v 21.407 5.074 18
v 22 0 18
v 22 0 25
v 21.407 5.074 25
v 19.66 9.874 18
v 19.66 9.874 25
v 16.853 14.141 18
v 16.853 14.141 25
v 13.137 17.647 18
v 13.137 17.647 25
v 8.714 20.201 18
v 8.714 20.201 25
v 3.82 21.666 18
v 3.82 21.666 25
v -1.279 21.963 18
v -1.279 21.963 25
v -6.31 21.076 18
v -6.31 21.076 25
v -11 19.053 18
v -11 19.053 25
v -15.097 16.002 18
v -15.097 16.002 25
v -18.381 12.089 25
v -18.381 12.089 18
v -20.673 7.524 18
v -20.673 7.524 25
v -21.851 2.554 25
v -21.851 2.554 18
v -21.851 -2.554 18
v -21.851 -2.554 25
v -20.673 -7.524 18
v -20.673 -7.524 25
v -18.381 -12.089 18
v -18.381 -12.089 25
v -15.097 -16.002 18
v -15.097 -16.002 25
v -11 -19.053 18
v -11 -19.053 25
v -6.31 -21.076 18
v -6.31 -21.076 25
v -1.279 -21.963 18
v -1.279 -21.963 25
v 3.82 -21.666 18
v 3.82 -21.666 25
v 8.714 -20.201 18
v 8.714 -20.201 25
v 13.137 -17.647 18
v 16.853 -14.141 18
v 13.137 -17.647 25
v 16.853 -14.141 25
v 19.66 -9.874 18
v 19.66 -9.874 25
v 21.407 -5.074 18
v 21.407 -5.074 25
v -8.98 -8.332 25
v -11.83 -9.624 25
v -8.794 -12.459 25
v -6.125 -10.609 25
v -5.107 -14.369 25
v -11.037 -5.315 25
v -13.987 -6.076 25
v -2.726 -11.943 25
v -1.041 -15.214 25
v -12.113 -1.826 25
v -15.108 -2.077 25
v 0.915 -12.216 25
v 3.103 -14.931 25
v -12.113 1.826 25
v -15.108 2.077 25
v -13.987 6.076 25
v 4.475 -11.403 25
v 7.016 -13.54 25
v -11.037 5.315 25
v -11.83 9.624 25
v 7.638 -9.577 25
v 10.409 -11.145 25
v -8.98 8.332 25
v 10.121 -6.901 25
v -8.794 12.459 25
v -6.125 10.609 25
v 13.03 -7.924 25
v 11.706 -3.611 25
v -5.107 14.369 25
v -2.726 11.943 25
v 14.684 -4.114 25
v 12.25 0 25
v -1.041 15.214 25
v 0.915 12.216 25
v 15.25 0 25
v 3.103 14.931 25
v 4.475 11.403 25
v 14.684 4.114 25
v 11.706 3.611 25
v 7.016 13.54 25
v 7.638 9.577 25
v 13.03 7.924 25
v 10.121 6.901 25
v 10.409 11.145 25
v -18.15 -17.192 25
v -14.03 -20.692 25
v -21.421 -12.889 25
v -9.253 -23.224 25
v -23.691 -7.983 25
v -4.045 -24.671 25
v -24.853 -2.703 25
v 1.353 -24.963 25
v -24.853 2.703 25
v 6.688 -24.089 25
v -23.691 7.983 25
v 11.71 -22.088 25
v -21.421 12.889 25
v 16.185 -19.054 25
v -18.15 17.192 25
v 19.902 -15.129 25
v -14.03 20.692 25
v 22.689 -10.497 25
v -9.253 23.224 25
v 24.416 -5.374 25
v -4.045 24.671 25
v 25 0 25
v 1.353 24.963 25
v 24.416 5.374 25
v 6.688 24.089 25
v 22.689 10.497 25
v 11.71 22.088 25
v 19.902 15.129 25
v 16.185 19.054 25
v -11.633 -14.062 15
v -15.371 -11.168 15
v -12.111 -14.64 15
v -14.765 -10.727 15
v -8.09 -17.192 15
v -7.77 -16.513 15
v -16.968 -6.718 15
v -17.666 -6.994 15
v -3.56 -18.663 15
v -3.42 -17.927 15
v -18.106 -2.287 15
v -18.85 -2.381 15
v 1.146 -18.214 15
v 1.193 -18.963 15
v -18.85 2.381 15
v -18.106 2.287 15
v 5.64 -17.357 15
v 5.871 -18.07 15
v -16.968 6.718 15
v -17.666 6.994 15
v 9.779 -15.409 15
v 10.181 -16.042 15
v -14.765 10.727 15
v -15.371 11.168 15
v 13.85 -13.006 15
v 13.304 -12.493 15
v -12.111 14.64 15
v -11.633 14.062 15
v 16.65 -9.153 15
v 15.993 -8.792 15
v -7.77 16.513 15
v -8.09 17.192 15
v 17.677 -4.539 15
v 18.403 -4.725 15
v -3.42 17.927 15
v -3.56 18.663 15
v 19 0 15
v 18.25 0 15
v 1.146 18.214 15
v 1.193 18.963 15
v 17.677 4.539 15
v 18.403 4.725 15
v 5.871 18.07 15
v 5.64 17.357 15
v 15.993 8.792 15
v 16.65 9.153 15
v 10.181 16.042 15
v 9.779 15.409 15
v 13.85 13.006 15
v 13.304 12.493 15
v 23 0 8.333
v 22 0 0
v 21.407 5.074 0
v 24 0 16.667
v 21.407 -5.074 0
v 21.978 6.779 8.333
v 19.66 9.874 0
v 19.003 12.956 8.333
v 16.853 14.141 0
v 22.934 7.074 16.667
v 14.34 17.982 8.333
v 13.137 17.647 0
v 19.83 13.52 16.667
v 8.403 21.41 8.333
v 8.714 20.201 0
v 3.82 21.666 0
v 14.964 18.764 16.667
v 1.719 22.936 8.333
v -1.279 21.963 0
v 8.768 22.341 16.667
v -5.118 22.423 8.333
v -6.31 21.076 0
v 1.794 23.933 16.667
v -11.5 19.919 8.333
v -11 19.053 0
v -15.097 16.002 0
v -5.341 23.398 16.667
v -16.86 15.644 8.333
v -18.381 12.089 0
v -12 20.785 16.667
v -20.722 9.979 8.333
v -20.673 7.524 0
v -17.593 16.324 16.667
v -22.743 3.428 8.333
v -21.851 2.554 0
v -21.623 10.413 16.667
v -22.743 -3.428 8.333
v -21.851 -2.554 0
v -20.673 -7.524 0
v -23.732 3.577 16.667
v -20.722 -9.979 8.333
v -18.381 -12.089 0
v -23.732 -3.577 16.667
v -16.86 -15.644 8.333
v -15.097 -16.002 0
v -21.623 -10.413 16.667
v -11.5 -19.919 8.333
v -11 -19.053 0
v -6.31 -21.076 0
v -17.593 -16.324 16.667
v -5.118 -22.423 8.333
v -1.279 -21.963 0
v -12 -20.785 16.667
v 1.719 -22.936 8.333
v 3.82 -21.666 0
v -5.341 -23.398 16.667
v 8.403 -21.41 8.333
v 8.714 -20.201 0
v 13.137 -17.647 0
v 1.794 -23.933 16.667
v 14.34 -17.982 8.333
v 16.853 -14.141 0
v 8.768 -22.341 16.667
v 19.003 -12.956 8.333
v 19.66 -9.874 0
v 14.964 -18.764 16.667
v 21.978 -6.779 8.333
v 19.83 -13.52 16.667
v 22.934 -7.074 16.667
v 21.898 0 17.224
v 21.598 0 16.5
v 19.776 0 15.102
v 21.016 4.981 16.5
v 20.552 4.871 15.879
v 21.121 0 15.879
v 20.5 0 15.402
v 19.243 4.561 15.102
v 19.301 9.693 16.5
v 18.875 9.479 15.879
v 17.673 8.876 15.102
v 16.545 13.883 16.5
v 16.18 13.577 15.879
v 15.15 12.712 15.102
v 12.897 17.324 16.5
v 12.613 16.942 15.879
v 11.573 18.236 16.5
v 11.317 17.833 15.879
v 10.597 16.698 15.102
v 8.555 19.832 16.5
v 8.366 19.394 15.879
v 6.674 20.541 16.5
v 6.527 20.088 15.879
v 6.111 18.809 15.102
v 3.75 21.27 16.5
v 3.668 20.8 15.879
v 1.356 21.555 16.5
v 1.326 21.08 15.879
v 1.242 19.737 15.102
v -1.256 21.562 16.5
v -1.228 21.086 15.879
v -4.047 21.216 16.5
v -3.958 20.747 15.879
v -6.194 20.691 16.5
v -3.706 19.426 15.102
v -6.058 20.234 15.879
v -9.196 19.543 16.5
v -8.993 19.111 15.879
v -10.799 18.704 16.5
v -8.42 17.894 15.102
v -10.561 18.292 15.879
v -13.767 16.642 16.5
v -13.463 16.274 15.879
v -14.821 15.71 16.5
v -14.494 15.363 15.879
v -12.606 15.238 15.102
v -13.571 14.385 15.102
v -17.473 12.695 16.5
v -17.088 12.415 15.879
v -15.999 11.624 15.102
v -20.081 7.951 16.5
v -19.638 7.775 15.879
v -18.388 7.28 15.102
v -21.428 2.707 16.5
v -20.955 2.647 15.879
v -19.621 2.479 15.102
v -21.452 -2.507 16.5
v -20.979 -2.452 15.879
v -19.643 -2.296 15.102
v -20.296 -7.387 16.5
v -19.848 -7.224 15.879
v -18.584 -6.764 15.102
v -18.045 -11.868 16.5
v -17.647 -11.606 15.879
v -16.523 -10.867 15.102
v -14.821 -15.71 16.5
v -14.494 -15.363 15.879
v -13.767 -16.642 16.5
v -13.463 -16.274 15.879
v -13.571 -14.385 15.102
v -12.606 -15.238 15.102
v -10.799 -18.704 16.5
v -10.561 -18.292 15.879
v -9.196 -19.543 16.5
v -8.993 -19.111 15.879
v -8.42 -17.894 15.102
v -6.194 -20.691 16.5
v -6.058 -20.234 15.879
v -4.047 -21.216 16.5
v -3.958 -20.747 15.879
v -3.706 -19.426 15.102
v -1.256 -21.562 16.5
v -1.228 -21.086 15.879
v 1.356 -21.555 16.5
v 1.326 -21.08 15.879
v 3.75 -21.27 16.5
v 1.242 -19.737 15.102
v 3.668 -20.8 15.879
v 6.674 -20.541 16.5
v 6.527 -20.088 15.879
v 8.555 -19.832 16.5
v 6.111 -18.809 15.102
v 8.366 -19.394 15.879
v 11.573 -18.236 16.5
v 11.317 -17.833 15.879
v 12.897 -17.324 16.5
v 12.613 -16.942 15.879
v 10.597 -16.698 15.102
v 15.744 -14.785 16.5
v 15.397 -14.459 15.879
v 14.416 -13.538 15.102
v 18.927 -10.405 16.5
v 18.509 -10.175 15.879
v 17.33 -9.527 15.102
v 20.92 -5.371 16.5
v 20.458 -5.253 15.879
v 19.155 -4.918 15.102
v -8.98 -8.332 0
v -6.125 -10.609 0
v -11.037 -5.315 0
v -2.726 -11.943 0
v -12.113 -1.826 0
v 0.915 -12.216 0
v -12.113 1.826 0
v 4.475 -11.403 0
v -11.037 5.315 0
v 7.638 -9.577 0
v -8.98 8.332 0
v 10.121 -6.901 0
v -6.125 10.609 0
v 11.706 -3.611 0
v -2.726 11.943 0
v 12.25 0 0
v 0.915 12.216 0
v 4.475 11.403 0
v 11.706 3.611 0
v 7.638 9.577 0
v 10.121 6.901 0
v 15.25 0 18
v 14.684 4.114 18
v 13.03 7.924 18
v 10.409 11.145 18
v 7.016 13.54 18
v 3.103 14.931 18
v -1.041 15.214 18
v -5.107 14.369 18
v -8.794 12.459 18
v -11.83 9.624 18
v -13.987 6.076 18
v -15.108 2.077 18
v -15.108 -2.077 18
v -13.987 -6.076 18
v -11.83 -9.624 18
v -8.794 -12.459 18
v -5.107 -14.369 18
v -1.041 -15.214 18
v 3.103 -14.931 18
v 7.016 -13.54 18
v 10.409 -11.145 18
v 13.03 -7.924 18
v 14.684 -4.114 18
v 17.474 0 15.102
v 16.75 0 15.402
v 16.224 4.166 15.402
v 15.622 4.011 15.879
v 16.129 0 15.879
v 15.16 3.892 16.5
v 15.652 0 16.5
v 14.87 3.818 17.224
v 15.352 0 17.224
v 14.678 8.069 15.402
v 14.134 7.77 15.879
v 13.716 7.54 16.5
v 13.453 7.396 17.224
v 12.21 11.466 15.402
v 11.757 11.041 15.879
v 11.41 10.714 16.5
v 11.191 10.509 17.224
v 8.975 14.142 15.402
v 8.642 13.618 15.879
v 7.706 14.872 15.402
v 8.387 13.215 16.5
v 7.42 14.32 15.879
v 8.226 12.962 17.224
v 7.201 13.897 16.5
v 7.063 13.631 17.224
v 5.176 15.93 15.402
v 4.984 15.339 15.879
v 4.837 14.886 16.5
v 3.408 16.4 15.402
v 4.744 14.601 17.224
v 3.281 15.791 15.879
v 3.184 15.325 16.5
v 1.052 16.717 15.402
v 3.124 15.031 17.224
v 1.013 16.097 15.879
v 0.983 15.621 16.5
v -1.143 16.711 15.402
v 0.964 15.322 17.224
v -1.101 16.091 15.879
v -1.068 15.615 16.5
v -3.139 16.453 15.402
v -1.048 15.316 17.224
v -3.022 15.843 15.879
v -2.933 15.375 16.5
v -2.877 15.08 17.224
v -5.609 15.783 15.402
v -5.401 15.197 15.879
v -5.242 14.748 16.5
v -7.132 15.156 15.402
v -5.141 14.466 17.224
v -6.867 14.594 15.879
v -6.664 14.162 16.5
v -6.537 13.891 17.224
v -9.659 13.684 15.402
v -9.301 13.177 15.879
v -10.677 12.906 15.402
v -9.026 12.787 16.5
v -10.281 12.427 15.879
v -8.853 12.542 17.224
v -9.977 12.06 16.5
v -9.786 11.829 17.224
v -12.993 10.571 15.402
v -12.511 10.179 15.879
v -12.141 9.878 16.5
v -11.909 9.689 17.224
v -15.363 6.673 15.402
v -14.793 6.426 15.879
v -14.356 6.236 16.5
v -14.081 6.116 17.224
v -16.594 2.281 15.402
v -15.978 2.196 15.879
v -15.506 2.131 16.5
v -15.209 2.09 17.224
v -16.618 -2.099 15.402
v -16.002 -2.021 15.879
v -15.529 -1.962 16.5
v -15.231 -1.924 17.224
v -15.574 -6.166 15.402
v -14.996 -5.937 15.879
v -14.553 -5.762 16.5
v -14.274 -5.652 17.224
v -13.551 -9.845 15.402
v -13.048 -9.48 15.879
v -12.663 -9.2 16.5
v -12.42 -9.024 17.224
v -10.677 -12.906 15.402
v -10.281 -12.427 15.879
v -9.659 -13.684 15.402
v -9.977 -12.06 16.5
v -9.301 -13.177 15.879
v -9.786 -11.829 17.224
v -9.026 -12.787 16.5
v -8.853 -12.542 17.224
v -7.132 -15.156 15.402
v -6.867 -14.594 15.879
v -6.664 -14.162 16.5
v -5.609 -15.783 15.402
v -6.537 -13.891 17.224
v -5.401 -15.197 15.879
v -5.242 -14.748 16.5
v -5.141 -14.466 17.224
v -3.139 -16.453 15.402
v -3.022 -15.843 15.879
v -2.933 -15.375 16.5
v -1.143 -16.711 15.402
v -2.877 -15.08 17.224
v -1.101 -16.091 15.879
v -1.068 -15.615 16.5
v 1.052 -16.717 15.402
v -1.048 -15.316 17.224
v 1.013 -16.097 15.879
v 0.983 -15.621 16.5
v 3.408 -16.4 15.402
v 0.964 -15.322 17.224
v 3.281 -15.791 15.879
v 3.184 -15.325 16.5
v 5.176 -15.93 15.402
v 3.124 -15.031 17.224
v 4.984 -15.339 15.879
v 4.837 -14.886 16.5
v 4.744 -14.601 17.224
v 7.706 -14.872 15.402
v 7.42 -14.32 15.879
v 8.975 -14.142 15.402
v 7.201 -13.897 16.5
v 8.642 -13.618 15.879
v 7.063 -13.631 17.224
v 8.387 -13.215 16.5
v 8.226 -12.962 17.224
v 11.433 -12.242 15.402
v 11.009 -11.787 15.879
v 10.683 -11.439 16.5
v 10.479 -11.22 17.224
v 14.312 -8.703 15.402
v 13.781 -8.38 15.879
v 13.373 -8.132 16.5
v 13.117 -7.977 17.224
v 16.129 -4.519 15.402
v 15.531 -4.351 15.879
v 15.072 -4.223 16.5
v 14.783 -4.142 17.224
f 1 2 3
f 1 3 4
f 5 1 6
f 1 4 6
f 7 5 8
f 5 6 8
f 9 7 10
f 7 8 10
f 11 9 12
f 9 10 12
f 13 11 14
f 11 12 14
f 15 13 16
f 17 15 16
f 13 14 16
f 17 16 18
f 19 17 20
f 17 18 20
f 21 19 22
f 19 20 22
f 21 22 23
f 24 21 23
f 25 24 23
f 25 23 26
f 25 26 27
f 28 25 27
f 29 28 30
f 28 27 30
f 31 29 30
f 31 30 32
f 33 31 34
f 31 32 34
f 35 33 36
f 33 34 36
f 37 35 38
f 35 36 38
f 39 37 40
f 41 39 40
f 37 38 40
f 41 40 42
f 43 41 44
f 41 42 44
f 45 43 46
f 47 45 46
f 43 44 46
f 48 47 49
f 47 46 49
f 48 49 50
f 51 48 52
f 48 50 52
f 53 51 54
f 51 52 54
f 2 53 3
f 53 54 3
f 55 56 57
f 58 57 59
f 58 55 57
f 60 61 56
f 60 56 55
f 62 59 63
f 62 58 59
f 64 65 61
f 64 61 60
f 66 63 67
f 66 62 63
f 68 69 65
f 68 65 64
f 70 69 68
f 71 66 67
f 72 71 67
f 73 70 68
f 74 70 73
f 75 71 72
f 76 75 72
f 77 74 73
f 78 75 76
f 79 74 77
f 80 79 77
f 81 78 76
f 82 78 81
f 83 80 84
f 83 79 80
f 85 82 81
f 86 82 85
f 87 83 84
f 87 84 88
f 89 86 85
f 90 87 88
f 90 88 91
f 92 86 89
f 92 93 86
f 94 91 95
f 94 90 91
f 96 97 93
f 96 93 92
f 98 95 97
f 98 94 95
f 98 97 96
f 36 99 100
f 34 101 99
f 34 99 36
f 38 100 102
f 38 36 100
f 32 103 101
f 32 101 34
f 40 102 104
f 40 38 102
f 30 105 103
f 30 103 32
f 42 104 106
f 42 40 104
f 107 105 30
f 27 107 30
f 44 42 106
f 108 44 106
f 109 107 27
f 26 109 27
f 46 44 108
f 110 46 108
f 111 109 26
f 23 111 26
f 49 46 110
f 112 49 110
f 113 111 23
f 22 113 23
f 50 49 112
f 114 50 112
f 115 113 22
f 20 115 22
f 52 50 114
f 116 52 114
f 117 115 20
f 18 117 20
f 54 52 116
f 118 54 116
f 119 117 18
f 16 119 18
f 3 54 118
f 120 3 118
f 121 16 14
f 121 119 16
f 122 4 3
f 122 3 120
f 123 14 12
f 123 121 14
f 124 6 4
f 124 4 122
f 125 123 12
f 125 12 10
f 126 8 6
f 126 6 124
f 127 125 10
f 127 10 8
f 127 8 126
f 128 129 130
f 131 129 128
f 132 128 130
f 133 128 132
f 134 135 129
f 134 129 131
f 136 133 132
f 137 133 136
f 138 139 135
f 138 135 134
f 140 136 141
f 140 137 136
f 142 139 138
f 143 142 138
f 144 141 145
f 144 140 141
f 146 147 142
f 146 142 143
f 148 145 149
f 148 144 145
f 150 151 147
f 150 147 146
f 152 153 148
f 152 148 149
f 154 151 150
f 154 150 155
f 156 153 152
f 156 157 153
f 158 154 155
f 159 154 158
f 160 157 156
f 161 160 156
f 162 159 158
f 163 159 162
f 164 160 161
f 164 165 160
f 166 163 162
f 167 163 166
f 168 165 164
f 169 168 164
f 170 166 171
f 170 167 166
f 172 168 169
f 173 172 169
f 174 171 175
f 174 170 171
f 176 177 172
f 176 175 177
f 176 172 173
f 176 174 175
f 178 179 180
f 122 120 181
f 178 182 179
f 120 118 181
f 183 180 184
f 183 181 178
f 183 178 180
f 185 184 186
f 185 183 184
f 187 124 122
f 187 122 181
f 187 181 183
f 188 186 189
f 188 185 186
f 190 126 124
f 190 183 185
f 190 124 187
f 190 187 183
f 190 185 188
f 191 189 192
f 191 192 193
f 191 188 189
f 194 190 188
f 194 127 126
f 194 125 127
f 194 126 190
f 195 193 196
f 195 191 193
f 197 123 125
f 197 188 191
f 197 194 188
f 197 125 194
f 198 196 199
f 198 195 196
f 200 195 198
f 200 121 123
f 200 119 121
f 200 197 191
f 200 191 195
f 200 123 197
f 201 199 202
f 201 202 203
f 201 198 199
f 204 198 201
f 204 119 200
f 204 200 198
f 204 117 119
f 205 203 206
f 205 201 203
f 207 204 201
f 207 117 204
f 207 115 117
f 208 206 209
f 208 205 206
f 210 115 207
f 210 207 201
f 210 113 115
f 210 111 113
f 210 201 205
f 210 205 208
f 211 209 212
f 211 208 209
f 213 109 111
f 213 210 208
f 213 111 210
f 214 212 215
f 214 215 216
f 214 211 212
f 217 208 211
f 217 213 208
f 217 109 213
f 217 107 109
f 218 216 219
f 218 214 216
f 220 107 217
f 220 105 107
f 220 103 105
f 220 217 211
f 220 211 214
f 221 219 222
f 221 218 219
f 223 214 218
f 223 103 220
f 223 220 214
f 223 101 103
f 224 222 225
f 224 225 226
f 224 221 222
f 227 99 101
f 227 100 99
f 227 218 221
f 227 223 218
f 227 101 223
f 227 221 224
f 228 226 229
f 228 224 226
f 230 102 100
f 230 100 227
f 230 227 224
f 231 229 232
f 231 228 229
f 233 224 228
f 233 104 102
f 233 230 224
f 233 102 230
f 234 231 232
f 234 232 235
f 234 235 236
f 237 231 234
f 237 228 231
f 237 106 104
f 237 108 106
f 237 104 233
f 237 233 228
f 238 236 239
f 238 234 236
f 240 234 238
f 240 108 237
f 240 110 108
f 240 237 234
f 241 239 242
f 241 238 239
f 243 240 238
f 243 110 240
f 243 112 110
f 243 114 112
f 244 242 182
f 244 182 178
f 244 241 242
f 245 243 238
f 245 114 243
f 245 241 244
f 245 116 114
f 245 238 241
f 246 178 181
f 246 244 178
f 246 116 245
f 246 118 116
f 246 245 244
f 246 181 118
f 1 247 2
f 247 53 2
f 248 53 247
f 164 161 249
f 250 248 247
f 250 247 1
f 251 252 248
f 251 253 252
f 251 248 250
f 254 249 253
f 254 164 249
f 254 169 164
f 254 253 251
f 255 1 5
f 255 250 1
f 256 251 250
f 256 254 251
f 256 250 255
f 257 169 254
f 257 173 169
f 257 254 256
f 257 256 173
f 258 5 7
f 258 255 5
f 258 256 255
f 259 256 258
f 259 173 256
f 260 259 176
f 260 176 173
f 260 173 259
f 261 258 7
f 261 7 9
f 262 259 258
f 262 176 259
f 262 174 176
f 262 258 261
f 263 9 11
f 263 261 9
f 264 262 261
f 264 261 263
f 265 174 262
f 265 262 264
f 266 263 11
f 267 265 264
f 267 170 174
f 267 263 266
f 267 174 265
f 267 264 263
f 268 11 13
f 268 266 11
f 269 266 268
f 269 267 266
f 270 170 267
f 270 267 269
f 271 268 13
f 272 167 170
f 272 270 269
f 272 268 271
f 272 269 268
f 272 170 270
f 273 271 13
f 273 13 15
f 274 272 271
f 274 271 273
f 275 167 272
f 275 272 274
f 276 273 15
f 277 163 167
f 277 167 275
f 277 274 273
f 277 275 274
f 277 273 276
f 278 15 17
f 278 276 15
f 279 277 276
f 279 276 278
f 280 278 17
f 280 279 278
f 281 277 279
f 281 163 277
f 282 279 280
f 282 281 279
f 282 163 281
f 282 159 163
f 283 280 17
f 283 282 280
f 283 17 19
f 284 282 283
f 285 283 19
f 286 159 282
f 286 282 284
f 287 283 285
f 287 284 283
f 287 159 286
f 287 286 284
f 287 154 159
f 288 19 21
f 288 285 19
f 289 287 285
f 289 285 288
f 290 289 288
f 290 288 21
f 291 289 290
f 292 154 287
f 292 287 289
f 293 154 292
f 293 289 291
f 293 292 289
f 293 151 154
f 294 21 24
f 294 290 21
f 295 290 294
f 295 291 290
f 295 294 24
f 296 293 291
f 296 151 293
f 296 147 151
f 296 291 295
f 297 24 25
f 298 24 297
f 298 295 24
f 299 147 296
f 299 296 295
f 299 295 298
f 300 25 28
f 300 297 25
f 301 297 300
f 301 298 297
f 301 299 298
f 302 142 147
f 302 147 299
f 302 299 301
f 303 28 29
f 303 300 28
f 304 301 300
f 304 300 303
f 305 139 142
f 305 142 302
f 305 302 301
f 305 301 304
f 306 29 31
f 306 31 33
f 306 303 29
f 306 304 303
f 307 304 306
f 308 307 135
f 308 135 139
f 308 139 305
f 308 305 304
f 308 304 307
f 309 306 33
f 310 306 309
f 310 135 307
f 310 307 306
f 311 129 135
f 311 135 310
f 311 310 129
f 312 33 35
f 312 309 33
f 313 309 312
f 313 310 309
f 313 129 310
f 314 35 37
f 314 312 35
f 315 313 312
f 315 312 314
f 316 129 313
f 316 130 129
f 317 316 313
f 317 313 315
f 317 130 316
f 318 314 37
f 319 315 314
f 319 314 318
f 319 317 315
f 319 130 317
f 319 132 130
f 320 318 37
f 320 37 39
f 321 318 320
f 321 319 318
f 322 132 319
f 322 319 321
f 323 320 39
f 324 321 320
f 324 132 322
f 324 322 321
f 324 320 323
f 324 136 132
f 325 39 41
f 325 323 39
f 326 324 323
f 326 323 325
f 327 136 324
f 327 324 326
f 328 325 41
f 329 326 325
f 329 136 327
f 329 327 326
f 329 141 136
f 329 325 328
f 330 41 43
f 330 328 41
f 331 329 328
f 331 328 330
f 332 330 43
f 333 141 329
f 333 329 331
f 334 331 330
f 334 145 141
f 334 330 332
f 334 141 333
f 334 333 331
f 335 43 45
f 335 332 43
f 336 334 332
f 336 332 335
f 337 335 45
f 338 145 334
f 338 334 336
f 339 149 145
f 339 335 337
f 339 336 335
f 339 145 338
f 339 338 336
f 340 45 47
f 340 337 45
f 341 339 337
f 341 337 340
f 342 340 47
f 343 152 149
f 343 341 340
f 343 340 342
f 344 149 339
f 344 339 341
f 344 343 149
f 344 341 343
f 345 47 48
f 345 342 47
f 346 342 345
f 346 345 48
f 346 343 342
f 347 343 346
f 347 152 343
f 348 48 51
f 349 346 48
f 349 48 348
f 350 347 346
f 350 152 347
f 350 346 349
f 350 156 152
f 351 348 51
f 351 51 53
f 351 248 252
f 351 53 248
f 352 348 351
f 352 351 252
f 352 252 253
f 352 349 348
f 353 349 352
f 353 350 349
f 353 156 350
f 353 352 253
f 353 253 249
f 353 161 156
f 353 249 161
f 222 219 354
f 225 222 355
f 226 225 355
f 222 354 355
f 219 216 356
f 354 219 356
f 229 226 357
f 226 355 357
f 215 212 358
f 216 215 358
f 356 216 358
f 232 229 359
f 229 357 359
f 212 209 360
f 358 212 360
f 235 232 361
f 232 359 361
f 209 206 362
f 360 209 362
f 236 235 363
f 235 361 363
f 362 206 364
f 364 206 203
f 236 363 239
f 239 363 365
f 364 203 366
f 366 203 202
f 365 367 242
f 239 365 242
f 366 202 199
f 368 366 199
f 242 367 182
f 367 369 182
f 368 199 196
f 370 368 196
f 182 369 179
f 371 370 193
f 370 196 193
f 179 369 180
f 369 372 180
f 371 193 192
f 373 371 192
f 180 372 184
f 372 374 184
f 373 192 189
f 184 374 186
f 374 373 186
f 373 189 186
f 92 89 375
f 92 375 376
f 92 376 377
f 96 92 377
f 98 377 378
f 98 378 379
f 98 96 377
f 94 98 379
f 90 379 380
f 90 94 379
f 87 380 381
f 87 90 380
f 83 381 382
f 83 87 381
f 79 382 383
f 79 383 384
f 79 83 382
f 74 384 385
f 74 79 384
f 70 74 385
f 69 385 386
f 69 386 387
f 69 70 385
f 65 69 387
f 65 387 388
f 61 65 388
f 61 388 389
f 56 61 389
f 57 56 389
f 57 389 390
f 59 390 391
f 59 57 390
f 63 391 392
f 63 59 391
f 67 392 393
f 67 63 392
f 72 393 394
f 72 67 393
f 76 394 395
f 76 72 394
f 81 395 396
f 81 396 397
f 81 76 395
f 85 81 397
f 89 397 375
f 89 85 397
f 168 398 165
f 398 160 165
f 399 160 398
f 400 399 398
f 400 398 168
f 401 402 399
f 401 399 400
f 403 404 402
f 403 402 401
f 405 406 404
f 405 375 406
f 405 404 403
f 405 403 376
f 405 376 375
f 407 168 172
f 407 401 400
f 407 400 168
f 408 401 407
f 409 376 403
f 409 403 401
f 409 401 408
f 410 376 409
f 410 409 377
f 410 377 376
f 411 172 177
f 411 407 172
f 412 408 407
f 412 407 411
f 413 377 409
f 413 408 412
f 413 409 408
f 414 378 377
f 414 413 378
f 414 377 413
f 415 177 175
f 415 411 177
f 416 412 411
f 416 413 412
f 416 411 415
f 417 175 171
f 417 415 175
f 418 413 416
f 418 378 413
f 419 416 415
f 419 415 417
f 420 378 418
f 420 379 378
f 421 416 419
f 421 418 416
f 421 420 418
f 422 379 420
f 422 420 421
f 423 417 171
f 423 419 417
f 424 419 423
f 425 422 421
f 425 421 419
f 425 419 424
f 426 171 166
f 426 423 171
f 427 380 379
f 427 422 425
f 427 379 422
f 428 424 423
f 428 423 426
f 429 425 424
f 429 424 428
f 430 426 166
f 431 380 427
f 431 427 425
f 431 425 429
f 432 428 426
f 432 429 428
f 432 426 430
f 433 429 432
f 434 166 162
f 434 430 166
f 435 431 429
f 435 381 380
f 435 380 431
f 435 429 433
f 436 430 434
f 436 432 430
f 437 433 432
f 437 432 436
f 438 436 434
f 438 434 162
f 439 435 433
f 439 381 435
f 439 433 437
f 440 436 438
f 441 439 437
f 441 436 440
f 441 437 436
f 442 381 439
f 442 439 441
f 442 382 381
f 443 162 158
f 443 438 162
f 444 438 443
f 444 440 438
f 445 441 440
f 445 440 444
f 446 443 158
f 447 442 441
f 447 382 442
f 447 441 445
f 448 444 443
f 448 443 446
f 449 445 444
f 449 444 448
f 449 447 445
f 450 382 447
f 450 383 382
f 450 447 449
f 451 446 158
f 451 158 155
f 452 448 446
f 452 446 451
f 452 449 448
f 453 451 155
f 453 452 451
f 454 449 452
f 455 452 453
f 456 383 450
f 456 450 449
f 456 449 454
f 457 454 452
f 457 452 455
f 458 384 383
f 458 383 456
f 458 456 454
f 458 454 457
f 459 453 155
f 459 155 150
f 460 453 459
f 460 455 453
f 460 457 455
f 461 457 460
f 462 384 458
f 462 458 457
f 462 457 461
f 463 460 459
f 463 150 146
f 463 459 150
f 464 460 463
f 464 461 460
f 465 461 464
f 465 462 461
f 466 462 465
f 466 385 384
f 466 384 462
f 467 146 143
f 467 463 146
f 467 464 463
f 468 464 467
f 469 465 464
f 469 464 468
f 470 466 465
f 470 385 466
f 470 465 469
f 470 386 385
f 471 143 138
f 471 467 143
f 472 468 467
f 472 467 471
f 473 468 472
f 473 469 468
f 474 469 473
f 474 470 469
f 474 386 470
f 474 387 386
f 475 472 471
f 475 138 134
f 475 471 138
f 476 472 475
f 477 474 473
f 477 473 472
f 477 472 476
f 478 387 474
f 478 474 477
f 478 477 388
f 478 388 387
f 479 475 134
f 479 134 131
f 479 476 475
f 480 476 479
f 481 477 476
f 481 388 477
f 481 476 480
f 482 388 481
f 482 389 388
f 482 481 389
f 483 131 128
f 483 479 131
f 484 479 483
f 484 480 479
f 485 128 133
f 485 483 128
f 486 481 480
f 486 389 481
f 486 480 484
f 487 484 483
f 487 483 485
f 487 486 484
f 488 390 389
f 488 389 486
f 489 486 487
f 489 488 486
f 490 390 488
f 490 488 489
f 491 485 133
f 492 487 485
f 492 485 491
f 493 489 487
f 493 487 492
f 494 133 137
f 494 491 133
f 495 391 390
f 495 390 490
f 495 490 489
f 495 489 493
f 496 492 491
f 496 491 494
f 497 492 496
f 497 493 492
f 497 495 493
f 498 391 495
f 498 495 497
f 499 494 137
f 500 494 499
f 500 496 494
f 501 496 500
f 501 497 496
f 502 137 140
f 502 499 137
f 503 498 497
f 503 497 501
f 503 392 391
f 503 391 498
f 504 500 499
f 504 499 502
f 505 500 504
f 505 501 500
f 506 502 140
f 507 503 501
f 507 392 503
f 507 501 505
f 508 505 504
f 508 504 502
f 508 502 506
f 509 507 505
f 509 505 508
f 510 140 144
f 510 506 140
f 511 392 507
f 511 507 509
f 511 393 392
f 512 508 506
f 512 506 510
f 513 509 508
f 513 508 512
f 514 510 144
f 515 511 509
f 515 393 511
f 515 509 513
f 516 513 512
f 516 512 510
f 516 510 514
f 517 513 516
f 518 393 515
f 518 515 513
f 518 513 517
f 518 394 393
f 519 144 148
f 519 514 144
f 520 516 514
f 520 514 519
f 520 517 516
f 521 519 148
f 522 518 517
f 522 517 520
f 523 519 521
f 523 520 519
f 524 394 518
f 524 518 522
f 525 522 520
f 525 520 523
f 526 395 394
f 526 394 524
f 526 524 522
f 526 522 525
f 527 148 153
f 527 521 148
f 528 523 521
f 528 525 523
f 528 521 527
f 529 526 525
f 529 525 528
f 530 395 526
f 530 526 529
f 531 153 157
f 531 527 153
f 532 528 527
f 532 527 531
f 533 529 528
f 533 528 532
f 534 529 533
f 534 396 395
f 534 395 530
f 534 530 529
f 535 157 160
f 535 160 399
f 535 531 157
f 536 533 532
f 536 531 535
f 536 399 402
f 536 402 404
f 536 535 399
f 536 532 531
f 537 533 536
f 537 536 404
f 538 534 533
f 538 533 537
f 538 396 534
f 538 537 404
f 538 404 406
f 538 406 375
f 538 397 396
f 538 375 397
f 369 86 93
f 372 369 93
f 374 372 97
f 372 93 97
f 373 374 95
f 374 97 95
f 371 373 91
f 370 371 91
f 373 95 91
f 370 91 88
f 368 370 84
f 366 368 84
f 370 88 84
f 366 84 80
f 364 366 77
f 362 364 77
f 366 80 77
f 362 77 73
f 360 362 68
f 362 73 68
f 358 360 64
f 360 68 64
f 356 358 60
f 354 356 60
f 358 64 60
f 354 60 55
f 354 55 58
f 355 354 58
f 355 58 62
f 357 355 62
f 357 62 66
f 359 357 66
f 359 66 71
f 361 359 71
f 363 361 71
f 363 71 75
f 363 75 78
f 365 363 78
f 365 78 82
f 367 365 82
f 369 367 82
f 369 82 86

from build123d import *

# Parameters (mm, degrees)
F0_R     = 22
F2_R     = 25
F4_R     = 12.25
F5_DEPTH = 25.001
F4_R_2   = 22
F4_R_3   = 15.25
F6_DEPTH = 10
F7_R     = 3


with BuildPart() as f3:
    # F0 (on Top) → F3 section 0
    with BuildSketch(Plane.XY):
        Circle(F0_R)
    # F2 (on offset) → F3 section 1
    with BuildSketch(Plane.XY.offset(25)):
        Circle(F2_R)
    loft()

    # F4 (on offset) → F5 (cut, through all)
    with BuildSketch(Plane.XY.offset(25)):
        Circle(F4_R)
    extrude(amount=-F5_DEPTH, mode=Mode.SUBTRACT)

    # F4 (on offset) → F6 (cut)
    with BuildSketch(Plane.XY.offset(25)):
        Circle(F4_R_2)
        Circle(F4_R_3, mode=Mode.SUBTRACT)
    extrude(amount=-F6_DEPTH, mode=Mode.SUBTRACT)

    # F7
    f7_edges = [f3.edges().sort_by_distance(p)[0] for p in [
        (-22, 0, 15),
        (-15.25, 0, 15),
    ]]
    fillet(f7_edges, radius=F7_R)


solid = f3.part
